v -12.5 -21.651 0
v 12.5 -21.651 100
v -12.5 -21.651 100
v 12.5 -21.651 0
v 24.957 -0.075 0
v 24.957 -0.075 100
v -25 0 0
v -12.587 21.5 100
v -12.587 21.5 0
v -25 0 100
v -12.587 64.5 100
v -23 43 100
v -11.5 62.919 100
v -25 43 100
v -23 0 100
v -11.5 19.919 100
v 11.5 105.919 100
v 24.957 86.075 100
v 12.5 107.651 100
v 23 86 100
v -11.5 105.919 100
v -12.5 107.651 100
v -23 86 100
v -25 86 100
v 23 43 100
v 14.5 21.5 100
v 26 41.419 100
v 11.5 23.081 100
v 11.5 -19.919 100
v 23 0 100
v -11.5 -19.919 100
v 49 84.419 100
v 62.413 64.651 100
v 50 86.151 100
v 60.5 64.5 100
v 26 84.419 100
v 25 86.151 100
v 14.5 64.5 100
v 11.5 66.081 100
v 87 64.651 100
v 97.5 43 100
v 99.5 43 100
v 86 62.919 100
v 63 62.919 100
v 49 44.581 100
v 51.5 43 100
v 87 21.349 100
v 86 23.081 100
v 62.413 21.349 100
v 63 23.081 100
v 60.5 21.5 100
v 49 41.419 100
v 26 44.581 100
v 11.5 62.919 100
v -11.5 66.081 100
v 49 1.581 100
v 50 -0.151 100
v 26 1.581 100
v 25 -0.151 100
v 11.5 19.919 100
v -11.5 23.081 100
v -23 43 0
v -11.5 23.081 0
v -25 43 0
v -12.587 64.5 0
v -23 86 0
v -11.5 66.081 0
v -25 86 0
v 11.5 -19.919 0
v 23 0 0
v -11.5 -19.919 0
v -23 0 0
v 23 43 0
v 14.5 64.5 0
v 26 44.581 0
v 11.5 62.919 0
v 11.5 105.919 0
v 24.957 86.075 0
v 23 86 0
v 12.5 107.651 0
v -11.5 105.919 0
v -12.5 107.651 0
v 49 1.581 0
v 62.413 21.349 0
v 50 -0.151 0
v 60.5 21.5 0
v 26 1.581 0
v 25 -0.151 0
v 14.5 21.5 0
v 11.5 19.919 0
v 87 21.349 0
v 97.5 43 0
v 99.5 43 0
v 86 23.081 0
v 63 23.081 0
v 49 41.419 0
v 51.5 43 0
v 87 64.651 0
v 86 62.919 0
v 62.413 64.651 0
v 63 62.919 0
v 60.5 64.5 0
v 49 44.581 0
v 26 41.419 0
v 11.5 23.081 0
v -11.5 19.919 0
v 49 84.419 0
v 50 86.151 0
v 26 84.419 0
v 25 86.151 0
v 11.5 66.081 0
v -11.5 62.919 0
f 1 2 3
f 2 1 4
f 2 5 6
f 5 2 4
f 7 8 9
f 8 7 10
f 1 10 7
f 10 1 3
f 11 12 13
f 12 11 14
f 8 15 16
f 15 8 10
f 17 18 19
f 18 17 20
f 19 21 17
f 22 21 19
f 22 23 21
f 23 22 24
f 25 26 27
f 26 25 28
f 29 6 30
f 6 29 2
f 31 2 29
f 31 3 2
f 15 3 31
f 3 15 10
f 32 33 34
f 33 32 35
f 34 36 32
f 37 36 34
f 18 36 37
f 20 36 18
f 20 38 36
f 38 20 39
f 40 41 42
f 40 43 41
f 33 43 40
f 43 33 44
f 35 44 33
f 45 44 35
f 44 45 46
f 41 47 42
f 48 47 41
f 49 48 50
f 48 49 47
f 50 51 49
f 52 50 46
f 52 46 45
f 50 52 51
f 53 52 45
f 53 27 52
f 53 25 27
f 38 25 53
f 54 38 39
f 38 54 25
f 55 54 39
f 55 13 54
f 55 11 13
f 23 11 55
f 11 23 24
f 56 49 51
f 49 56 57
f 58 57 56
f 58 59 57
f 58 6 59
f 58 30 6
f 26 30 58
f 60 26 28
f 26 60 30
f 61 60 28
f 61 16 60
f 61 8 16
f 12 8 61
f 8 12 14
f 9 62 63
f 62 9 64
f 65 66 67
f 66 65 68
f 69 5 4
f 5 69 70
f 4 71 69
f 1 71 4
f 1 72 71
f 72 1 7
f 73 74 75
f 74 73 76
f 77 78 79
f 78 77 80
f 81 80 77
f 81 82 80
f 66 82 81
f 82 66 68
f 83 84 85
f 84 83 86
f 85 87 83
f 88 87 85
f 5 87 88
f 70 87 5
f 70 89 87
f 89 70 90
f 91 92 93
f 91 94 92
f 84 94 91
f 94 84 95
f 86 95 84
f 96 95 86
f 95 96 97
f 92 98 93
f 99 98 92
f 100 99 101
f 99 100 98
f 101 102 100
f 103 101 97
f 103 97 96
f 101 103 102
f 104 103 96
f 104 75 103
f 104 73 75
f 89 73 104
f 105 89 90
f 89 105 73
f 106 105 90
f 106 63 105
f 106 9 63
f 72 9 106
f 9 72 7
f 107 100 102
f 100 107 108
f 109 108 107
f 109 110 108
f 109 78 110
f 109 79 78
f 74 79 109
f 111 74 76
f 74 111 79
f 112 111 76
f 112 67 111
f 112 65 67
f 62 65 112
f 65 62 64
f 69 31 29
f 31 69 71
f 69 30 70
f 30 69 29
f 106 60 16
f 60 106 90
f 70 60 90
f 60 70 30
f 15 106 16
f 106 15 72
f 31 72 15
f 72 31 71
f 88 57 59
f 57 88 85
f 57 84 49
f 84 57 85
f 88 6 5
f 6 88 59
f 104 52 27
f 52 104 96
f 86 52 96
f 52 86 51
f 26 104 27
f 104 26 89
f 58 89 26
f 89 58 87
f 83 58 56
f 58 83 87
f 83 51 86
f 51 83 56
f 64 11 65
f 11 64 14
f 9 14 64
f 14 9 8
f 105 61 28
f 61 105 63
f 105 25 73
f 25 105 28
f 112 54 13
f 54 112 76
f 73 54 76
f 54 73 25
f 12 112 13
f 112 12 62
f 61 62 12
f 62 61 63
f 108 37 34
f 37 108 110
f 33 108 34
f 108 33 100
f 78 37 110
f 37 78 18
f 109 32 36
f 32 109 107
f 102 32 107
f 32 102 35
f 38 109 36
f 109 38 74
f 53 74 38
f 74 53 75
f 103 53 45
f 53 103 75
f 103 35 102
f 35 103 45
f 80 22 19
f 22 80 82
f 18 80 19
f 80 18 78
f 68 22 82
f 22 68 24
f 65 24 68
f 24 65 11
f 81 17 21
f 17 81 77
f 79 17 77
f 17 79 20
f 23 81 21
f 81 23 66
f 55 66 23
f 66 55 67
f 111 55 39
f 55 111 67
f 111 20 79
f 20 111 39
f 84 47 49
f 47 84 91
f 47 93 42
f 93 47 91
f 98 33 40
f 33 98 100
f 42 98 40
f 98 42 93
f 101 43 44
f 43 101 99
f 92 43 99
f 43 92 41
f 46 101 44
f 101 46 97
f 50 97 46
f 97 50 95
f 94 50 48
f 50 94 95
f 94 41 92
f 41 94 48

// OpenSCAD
//Hive storage by jeremie rioux
$fn = 6;

//variable en millimetre
//the width and length have to be the same number; if not, it will create a stretched hive.
width_length=0;
height=0;

resize(newsize=[width_length,width_length,height]){
difference(){
cylinder(r=25, h=100);
cylinder(r=23, h=100); 
   
}
difference() {
translate([37.5,21.5,0])
cylinder(r=25,h=100);
translate([37.5,21.5,0])
cylinder(r=23,h=100);
}
translate([0,43,0]){
difference(){
cylinder(r=25, h=100);
cylinder(r=23, h=100); 
   
}
difference() {
translate([37.5,21.5,0])
cylinder(r=25,h=100);
translate([37.5,21.5,0])
cylinder(r=23,h=100);
}
}
translate([-37.5,64.5,0]){
difference() {
translate([37.5,21.5,0])
cylinder(r=25,h=100);
translate([37.5,21.5,0])
cylinder(r=23,h=100);
}
}
translate([37,21.5,0]){
difference() {
translate([37.5,21.5,0])
cylinder(r=25,h=100);
translate([37.5,21.5,0])
cylinder(r=23,h=100);
}
}
}
